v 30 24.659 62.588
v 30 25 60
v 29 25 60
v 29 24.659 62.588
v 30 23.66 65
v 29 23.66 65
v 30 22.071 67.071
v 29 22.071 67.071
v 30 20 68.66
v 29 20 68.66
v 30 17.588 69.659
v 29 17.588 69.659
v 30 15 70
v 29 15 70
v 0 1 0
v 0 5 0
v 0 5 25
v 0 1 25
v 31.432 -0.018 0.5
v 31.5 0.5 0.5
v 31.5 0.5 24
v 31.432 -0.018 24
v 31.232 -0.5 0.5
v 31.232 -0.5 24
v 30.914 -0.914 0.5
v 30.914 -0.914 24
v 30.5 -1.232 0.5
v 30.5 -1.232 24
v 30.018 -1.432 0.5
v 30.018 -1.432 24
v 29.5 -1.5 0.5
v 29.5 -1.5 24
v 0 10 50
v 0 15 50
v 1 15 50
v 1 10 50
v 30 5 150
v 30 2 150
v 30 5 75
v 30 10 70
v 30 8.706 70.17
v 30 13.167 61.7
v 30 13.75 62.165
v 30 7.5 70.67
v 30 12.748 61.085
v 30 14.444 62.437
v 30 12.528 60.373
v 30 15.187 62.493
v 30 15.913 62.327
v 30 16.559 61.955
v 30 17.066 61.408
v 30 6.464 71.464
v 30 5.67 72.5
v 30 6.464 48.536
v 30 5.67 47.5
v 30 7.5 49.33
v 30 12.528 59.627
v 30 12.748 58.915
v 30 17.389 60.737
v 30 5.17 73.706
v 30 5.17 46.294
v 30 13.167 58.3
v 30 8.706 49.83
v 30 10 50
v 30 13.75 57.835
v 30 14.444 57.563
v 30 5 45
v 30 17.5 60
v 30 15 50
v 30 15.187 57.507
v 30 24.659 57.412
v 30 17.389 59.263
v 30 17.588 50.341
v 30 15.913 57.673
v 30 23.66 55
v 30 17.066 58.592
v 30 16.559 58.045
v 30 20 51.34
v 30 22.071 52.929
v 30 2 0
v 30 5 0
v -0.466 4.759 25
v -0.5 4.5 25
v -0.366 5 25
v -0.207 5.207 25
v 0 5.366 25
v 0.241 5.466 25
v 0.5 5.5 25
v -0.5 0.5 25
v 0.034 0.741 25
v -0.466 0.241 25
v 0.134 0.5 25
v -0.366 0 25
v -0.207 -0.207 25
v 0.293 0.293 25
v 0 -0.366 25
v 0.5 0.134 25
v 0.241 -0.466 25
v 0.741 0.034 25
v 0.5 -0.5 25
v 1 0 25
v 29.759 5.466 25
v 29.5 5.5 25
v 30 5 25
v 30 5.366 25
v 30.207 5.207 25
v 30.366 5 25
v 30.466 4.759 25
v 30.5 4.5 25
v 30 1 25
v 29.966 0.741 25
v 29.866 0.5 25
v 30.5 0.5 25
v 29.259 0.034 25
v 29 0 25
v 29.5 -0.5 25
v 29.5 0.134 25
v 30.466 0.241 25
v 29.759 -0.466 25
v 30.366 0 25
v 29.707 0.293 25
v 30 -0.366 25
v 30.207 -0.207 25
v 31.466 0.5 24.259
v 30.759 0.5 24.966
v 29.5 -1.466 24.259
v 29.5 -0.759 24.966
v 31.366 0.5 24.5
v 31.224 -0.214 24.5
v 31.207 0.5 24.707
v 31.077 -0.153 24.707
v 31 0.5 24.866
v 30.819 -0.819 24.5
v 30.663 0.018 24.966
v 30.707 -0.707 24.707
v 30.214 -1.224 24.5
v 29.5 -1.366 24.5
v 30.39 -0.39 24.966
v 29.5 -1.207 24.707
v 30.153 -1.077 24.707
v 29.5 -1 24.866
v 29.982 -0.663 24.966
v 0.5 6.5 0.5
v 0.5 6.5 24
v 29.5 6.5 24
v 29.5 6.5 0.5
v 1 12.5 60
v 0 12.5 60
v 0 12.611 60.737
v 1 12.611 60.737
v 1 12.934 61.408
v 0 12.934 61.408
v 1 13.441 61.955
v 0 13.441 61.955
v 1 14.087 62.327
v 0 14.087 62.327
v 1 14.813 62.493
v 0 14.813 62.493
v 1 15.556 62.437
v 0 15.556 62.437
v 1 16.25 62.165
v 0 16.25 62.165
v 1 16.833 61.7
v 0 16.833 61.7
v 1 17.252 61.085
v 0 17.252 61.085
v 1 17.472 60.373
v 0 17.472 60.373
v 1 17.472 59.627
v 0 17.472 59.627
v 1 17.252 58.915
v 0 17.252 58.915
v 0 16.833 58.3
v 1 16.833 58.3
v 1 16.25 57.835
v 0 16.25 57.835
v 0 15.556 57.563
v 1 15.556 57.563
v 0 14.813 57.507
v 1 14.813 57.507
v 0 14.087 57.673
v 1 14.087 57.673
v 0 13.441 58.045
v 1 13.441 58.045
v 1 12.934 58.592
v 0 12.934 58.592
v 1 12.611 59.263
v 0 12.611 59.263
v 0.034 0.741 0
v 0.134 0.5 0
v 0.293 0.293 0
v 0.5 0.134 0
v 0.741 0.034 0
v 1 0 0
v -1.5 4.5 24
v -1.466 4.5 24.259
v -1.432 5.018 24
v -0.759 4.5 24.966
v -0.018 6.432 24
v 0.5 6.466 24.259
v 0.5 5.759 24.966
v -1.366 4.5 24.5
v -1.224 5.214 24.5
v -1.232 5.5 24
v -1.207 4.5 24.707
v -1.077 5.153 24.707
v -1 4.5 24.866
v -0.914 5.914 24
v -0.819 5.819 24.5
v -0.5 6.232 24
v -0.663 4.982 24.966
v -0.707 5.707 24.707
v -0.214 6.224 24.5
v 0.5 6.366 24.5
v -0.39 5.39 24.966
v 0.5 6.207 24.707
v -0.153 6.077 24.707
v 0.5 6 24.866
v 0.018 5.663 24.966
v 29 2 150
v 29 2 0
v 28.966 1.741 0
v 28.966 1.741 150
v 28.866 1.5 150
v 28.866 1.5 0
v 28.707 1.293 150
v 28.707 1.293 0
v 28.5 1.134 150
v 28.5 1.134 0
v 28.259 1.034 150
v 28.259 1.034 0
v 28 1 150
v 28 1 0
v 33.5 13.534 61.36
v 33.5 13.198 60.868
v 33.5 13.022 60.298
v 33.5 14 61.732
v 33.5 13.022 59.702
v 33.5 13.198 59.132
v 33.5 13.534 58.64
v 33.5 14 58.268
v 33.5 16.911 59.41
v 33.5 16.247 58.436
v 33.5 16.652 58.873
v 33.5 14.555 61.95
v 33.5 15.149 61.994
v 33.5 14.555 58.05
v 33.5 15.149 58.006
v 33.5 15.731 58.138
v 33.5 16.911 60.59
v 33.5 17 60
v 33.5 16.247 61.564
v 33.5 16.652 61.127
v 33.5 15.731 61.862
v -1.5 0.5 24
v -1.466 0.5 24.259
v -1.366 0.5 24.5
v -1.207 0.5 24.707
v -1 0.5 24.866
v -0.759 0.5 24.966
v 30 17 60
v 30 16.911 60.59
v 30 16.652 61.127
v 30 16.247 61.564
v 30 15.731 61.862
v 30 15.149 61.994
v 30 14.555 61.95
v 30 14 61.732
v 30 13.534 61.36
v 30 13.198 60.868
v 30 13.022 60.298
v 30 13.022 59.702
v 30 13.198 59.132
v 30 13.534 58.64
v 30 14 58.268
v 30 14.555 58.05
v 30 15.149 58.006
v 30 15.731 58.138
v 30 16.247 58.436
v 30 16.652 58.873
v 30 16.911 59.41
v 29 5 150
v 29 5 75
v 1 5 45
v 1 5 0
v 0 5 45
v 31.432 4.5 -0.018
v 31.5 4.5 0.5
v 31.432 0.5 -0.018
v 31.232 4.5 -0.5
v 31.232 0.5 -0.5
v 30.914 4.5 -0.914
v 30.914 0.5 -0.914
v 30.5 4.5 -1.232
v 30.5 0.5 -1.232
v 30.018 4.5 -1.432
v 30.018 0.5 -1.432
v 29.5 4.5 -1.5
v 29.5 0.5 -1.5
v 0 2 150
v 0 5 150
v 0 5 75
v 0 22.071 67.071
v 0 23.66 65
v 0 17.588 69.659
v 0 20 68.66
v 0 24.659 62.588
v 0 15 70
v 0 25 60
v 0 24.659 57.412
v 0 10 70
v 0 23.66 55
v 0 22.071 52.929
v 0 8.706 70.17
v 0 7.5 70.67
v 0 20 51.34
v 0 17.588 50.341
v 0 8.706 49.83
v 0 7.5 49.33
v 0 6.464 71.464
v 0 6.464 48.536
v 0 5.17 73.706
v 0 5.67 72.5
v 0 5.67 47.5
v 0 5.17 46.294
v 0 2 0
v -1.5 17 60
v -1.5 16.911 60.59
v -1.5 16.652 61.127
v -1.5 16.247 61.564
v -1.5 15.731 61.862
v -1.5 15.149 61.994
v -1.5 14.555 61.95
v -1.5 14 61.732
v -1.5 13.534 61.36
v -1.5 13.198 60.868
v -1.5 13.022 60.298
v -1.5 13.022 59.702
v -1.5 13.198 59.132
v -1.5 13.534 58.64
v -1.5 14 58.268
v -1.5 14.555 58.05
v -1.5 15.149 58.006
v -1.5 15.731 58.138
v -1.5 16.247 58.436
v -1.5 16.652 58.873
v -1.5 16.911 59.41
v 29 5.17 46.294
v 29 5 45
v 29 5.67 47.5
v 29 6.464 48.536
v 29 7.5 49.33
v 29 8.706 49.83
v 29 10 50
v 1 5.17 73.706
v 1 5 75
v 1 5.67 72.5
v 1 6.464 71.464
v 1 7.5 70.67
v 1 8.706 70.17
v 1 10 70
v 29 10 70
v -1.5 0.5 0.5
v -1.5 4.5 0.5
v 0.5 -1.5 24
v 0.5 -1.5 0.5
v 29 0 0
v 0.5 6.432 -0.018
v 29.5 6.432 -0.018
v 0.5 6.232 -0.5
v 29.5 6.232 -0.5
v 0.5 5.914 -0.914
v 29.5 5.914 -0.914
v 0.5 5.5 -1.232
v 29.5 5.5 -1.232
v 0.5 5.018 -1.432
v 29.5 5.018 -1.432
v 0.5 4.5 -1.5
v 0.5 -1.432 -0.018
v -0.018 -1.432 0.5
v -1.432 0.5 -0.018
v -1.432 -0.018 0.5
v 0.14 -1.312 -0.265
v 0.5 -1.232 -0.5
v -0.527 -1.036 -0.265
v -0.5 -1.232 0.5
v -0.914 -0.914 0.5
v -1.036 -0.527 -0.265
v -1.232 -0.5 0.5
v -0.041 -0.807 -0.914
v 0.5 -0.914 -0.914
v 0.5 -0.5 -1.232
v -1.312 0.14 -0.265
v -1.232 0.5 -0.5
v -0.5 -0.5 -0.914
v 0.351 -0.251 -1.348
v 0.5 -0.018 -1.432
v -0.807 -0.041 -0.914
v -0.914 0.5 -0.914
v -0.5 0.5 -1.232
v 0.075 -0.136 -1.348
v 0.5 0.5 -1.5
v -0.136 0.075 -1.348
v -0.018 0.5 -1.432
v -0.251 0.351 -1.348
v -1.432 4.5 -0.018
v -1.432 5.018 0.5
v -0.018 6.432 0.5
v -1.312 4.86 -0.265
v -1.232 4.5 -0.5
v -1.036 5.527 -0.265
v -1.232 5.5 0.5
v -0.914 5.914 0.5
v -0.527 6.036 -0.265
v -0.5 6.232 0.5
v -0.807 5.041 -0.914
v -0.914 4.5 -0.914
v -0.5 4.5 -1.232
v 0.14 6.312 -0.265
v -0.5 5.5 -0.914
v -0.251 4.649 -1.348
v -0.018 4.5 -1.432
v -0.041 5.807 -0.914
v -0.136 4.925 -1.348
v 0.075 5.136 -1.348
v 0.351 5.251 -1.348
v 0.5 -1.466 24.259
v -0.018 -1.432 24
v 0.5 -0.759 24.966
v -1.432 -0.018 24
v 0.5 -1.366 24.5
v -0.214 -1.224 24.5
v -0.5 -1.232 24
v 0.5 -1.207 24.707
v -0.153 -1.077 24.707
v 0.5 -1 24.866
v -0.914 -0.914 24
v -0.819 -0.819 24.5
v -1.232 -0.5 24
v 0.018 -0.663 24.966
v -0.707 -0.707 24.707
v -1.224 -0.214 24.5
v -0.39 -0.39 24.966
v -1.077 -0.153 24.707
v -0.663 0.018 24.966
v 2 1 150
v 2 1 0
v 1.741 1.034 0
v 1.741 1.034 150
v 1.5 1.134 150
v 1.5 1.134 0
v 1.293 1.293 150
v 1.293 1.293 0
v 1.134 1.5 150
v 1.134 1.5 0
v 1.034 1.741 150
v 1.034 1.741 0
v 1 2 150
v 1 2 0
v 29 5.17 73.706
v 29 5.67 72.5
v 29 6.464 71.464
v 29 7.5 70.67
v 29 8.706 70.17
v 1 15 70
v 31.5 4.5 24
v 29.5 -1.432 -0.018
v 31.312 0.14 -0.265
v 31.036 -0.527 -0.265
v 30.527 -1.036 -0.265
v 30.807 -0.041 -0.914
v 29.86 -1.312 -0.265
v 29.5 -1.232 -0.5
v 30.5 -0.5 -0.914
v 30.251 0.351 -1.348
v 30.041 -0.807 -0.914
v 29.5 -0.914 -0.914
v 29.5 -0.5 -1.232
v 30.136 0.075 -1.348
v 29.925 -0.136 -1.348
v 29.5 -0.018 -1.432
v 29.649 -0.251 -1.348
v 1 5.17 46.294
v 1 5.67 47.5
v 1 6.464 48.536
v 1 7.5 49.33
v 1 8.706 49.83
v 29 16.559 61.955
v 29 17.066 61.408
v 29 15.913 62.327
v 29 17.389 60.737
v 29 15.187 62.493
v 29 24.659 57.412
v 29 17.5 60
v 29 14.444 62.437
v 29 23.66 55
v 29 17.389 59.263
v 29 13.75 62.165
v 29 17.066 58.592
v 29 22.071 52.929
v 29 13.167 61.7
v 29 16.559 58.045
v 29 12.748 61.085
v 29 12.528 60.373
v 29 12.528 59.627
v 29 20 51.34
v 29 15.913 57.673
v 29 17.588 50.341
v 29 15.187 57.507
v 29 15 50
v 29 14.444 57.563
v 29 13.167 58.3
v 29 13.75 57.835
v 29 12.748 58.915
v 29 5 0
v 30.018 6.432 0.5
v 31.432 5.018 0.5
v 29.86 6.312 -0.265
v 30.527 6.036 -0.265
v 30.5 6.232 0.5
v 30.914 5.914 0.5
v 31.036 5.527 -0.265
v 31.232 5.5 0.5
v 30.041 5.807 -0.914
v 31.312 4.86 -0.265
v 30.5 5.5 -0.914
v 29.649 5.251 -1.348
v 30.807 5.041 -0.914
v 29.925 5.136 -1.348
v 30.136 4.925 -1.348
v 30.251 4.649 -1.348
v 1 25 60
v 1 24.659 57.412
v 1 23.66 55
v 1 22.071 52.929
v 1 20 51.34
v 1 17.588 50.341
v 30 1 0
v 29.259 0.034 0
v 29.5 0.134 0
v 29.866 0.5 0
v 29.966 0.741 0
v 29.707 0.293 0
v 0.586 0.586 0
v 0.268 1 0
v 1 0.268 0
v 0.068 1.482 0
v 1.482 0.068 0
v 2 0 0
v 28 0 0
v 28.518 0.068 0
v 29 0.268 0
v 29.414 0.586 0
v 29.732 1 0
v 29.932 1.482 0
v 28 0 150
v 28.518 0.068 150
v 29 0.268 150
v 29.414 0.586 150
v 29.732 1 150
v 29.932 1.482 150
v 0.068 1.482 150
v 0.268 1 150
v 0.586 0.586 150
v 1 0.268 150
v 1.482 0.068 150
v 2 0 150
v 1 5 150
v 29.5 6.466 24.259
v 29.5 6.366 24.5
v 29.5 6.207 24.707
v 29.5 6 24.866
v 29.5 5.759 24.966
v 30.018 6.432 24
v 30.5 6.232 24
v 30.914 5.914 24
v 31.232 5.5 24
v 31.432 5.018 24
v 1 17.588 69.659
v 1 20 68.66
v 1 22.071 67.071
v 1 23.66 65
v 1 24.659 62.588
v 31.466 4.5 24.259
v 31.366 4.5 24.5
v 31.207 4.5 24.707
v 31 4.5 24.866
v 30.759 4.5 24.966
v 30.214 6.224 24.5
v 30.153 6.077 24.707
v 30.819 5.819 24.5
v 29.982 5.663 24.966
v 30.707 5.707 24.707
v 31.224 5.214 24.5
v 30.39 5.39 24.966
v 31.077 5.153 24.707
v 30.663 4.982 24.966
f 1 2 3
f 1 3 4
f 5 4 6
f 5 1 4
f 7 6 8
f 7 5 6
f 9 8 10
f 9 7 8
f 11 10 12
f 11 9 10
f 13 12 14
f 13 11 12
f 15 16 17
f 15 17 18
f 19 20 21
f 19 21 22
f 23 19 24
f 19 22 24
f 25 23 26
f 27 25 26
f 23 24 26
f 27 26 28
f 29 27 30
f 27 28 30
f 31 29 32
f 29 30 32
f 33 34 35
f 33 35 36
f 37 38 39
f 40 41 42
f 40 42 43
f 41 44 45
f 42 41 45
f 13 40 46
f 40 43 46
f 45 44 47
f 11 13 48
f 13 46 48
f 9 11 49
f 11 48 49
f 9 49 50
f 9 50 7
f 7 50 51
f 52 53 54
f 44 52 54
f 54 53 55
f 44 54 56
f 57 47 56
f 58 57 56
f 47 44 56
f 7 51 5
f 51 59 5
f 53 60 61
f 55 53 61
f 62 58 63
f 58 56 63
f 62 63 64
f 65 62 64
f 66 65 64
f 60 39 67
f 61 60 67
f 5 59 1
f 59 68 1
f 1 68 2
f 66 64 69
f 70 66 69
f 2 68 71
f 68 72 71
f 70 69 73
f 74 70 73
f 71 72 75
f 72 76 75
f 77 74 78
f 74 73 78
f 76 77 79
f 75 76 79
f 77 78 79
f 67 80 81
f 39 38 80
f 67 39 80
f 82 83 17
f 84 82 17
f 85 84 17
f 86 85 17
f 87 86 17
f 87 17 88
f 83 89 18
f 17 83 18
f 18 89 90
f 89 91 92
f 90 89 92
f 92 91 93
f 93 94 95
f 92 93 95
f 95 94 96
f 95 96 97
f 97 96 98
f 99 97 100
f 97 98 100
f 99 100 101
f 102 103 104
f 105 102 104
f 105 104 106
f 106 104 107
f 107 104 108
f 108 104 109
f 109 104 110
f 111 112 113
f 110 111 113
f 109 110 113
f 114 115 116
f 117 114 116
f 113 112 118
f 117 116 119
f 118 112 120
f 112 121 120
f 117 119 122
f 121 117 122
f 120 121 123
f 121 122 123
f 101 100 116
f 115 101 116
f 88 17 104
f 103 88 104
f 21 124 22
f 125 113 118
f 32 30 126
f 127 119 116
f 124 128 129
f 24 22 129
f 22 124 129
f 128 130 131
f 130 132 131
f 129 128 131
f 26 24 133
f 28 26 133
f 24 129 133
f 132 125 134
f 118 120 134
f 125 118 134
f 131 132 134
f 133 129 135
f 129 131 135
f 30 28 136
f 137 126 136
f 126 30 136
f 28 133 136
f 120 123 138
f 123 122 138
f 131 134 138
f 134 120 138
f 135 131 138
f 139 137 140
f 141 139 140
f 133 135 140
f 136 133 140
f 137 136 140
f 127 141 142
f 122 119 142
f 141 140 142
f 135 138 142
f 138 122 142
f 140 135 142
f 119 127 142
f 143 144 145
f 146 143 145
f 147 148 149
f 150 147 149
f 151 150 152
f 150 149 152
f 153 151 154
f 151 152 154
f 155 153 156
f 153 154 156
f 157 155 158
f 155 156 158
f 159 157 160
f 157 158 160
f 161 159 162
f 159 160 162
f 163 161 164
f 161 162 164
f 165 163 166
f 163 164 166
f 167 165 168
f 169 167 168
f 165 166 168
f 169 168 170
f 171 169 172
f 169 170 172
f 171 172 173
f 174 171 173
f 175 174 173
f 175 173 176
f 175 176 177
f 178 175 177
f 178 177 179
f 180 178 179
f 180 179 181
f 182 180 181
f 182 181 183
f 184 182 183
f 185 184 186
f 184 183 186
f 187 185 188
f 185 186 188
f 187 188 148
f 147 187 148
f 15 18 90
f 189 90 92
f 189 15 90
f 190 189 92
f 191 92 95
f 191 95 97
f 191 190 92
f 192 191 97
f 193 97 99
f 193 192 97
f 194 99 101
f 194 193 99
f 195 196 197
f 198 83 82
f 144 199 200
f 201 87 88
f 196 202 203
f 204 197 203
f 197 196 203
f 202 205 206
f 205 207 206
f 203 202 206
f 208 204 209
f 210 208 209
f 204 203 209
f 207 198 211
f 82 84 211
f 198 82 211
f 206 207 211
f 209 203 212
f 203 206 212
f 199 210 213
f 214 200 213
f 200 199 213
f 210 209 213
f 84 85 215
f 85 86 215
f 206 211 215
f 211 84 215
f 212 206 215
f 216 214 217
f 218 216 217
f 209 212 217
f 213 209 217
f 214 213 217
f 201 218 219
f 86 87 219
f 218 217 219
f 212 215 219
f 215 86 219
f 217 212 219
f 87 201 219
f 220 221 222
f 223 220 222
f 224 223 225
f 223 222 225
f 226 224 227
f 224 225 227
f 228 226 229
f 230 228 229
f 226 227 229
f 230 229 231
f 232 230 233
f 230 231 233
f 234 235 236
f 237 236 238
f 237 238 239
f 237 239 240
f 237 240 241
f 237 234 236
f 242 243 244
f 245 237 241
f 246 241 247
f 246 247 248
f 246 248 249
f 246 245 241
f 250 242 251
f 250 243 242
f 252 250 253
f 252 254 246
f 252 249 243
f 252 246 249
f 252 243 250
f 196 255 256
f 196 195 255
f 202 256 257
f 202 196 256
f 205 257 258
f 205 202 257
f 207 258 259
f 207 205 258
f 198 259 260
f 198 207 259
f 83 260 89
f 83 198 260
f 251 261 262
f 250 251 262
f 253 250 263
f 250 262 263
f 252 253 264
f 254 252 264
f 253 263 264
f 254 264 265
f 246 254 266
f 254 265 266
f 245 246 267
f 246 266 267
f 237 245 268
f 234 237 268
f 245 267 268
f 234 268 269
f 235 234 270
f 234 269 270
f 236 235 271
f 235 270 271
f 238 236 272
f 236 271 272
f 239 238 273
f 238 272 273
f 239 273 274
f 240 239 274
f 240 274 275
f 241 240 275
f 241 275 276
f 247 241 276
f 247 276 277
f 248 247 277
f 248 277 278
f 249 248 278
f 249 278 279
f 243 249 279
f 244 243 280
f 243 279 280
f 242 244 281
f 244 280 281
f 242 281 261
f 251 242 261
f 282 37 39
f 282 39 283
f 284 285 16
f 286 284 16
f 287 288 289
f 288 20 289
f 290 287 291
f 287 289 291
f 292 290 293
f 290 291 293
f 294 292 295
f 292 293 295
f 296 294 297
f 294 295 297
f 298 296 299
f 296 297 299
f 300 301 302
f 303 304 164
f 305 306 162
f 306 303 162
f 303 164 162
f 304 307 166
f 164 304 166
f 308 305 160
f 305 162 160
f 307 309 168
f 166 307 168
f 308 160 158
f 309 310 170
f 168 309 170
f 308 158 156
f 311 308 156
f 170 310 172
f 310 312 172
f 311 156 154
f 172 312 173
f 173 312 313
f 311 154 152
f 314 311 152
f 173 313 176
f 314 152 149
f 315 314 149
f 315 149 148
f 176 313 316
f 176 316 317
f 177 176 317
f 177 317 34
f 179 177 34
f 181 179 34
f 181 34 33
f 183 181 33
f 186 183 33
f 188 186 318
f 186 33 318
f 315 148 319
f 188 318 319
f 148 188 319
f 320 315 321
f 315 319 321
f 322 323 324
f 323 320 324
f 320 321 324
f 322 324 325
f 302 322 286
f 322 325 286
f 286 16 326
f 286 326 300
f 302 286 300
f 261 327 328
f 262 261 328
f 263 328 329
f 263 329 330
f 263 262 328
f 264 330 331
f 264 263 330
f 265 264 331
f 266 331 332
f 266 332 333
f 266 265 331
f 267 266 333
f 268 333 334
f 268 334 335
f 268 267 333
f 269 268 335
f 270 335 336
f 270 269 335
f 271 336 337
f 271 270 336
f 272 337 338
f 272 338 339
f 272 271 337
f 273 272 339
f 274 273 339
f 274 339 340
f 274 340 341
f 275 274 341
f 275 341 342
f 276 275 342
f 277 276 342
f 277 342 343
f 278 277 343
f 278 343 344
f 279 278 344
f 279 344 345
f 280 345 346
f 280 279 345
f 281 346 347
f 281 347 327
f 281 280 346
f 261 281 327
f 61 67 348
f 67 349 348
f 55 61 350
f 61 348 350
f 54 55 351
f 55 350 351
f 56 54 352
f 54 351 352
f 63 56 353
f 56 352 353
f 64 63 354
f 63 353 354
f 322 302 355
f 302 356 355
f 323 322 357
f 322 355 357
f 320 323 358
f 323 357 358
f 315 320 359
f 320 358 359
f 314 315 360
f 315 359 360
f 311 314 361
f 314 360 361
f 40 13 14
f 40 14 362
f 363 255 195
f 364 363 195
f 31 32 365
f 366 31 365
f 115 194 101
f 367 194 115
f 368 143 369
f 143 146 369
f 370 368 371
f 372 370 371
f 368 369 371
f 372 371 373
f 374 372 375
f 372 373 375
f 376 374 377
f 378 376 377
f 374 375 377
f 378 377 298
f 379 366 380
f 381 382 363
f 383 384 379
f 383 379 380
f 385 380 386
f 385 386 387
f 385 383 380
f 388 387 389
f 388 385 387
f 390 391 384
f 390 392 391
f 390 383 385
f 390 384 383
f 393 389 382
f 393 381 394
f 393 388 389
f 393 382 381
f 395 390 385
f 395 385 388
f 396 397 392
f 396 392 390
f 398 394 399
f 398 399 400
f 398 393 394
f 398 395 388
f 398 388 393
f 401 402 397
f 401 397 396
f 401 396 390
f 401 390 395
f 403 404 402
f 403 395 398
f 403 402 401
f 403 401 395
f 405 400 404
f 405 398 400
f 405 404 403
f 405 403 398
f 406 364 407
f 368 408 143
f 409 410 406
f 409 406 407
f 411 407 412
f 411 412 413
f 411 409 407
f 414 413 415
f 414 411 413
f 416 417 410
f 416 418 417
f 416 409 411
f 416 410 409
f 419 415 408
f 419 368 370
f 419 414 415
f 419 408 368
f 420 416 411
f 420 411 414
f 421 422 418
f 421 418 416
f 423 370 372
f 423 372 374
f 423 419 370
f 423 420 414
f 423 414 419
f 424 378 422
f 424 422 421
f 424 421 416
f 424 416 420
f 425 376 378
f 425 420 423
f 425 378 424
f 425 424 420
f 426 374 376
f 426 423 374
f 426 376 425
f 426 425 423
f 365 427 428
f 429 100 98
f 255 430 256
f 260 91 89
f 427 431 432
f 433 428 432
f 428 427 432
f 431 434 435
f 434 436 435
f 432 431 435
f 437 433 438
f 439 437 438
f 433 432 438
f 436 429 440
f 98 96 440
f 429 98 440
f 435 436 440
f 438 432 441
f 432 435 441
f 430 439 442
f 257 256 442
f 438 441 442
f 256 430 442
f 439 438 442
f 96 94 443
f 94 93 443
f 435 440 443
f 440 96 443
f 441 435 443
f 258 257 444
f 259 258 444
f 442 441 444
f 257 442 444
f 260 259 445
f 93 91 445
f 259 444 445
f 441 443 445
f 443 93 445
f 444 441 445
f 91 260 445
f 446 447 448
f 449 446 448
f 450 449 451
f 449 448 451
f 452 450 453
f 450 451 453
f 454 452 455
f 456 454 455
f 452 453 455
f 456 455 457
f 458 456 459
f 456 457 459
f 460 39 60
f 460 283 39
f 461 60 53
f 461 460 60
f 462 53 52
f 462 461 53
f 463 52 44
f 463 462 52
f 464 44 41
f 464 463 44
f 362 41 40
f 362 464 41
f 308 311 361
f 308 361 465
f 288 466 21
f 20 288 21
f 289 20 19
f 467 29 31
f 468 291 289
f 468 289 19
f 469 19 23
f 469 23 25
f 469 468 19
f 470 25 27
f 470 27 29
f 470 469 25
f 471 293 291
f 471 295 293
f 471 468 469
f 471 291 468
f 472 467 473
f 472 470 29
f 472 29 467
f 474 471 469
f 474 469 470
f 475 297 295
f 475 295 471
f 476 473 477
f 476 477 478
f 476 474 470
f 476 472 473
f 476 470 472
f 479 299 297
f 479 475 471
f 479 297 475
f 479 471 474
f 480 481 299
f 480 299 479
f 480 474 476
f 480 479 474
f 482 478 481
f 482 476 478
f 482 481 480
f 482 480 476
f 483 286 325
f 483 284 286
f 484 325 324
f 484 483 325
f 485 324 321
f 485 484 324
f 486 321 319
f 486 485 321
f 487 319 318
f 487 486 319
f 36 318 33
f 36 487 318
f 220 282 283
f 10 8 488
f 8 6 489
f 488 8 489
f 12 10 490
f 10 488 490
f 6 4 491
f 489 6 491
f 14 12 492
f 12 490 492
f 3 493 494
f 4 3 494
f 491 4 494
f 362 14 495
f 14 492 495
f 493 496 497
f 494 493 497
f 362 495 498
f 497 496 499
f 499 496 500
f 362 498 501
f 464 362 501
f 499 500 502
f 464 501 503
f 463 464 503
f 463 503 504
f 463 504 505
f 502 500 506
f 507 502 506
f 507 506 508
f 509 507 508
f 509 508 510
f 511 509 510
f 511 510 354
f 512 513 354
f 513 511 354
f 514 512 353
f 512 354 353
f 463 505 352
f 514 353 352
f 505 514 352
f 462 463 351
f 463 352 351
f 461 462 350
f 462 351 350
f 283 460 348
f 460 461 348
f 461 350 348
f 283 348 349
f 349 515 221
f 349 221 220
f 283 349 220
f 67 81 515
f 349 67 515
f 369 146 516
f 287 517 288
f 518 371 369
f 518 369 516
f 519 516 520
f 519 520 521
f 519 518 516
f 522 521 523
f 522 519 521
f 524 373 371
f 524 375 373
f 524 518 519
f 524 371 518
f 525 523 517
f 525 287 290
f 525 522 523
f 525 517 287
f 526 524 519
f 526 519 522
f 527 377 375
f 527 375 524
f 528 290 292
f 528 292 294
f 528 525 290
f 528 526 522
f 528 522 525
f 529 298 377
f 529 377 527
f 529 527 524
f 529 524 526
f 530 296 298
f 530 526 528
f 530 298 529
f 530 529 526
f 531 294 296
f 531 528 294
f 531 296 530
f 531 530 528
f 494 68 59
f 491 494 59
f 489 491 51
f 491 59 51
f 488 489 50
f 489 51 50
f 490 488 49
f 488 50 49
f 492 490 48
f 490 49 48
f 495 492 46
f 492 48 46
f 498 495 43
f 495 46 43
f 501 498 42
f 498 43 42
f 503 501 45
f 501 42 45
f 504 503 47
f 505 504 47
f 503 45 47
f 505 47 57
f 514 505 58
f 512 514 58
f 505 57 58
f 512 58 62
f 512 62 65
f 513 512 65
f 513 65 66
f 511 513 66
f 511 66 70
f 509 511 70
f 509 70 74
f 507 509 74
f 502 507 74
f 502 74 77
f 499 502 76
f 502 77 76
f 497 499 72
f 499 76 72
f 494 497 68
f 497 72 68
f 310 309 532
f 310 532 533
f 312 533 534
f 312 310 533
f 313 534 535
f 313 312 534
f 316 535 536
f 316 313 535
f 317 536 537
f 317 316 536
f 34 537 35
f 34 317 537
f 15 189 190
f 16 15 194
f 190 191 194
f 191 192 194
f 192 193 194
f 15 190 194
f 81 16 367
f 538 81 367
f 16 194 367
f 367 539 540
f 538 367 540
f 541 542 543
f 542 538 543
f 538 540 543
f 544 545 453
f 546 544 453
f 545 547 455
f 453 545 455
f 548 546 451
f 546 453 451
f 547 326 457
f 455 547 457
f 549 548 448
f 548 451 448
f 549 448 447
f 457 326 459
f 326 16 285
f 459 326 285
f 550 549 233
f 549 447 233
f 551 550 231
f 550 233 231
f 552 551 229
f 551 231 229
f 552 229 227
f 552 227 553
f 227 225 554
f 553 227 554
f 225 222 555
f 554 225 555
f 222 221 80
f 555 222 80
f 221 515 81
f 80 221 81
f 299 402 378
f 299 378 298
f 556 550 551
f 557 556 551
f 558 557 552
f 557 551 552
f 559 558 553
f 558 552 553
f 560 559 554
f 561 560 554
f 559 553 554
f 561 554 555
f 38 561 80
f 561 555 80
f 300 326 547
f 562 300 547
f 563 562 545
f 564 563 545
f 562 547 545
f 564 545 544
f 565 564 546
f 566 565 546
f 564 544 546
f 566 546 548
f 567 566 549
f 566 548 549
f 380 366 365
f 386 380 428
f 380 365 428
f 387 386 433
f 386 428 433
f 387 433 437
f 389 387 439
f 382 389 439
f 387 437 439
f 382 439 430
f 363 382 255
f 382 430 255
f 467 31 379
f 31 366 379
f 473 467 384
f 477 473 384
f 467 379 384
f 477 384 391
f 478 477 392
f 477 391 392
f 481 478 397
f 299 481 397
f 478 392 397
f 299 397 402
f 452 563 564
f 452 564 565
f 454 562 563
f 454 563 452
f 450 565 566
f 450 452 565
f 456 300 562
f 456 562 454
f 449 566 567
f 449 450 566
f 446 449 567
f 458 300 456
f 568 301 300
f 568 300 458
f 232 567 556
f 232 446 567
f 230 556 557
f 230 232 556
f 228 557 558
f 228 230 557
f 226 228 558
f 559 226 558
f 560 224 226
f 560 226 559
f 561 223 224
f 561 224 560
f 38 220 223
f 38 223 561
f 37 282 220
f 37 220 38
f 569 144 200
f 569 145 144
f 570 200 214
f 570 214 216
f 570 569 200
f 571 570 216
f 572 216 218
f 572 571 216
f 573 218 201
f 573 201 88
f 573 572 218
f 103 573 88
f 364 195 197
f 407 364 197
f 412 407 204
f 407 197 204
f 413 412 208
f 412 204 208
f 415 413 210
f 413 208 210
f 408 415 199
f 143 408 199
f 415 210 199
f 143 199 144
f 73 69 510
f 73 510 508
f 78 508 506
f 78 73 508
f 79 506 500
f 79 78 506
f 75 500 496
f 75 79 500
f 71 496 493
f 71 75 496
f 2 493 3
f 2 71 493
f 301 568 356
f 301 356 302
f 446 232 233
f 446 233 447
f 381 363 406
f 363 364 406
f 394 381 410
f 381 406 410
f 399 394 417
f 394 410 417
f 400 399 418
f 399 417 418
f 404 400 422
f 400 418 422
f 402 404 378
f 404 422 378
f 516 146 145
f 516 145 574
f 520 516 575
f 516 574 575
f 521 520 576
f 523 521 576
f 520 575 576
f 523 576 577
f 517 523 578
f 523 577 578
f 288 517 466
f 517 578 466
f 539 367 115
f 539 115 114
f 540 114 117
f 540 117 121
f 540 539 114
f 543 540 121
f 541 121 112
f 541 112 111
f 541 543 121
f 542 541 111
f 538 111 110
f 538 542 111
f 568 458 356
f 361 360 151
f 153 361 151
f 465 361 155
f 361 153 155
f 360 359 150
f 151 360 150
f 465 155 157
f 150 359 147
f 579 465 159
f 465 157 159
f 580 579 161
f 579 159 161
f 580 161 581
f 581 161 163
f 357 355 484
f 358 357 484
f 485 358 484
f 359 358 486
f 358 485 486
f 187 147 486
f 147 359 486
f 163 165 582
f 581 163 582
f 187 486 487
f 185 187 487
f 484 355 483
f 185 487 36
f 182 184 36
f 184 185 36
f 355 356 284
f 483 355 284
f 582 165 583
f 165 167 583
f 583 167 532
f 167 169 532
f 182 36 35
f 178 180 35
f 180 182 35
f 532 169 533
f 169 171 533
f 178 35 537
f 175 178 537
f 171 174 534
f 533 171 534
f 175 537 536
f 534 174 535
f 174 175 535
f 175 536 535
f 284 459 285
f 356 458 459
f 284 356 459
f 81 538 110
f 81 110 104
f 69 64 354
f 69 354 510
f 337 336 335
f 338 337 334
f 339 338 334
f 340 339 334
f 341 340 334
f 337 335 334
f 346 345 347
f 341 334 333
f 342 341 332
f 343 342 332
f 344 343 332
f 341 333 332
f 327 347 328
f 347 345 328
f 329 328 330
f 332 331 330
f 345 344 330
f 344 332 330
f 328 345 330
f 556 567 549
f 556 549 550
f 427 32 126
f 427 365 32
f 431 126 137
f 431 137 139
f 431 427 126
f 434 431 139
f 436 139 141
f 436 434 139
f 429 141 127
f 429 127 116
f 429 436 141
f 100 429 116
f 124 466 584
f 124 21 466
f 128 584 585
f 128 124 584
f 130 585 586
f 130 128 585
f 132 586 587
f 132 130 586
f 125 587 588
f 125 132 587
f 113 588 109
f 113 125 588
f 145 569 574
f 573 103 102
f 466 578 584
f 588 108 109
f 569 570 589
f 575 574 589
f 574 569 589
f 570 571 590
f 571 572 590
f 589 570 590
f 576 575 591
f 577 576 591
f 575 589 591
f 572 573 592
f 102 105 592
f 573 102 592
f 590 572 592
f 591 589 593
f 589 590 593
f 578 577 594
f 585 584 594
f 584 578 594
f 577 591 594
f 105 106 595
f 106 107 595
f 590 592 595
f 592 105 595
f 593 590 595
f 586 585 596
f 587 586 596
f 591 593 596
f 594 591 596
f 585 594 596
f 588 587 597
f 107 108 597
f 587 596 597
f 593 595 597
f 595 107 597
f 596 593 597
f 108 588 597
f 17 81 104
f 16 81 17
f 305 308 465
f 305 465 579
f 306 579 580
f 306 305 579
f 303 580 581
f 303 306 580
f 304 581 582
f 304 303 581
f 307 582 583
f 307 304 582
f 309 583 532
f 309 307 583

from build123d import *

# Parameters (mm, degrees)
F1_DEPTH       = 150
F2_R           = 2.5
F3_DEPTH       = 1
F4_R           = 5
F5_R           = 2.5
F6_DEPTH       = 1
F7_R           = 5
F10_R          = 2
F11_DEPTH      = 31.5
F11_DEPTH_BACK = 3.5
F13_DEPTH      = 25
F15_DEPTH      = 1.5
F16_R          = 2
F17_R          = 1


with BuildPart() as f1:
    # F0 (on Top) → F1 (new body)
    with BuildSketch(Plane.XY):
        with BuildLine():
            ThreePointArc((0, 2), (0.5857864376, 0.5857864376), (2, 0))
            Line((2, 0), (28, 0))
            ThreePointArc((28, 0), (29.4142135624, 0.5857864376), (30, 2))
            Line((30, 2), (30, 5))
            Line((30, 5), (29, 5))
            Line((29, 5), (29, 2))
            ThreePointArc((29, 2), (28.7071067812, 1.2928932188), (28, 1))
            Line((28, 1), (2, 1))
            ThreePointArc((2, 1), (1.2928932188, 1.2928932188), (1, 2))
            Line((1, 2), (1, 5))
            Line((1, 5), (0, 5))
            Line((0, 5), (0, 2))
        make_face()
    extrude(amount=F1_DEPTH)

    # F2 (on face) → F3 (join)
    with BuildSketch(Plane(origin=(0, 0, 0), x_dir=(0, -1, 0), z_dir=(-1, 0, 0))):
        with BuildLine():
            Line((-15, 50), (-5, 50))
            Line((-5, 50), (-5, 70))
            Line((-5, 70), (-15, 70))
            ThreePointArc((-15, 70), (-22.0710678119, 67.0710678119), (-25, 60))
            ThreePointArc((-25, 60), (-22.0710678119, 52.9289321881), (-15, 50))
        make_face()
        with Locations((-15, 60)):
            Circle(F2_R, mode=Mode.SUBTRACT)
    extrude(amount=-F3_DEPTH)

    # F4
    f4_edges = [f1.edges().sort_by_distance(p)[0] for p in [
        (0.5, 5, 50),
        (0.5, 5, 70),
    ]]
    fillet(f4_edges, radius=F4_R)

    # F5 (on face) → F6 (join)
    with BuildSketch(Plane.YZ.offset(30)):
        with BuildLine():
            Line((15, 70), (5, 70))
            Line((5, 70), (5, 50))
            Line((5, 50), (15, 50))
            ThreePointArc((15, 50), (22.0710678119, 52.9289321881), (25, 60))
            ThreePointArc((25, 60), (22.0710678119, 67.0710678119), (15, 70))
        make_face()
        with Locations((15, 60)):
            Circle(F5_R, mode=Mode.SUBTRACT)
    extrude(amount=-F6_DEPTH)

    # F7
    f7_edges = [f1.edges().sort_by_distance(p)[0] for p in [
        (29.5, 5, 70),
        (29.5, 5, 50),
    ]]
    fillet(f7_edges, radius=F7_R)


with BuildPart() as f8_1:
    # F8: copy of F1
    add(f1.part.moved(Location((0, 75, 0))))


with BuildPart() as f11:
    # F10 (on face) → F11 (new body, two sides)
    with BuildSketch(Plane.YZ.offset(30)) as f11_sk:
        with Locations((15, 60)):
            Circle(F10_R)
    extrude(amount=-F11_DEPTH)
    extrude(f11_sk.sketch, amount=F11_DEPTH_BACK)


with BuildPart() as f13:
    # F12 (on face) → F13 (new body)
    with BuildSketch(Plane(origin=(0, 0, 0), x_dir=(1, 0, 0), z_dir=(0, 0, -1))):
        with BuildLine():
            Line((31.5, -4.5), (31.5, -0.5))
            ThreePointArc((31.5, -0.5), (30.9142135624, 0.9142135624), (29.5, 1.5))
            Line((29.5, 1.5), (0.5, 1.5))
            ThreePointArc((0.5, 1.5), (-0.9142135624, 0.9142135624), (-1.5, -0.5))
            Line((-1.5, -0.5), (-1.5, -4.5))
            ThreePointArc((-1.5, -4.5), (-0.9142135624, -5.9142135624), (0.5, -6.5))
            Line((0.5, -6.5), (29.5, -6.5))
            ThreePointArc((29.5, -6.5), (30.9142135624, -5.9142135624), (31.5, -4.5))
        make_face()
        with BuildLine():
            ThreePointArc((0, -1), (0.2928932188, -0.2928932188), (1, 0))
            Line((1, 0), (2, 0))
            Line((2, 0), (28, 0))
            Line((28, 0), (29, 0))
            ThreePointArc((29, 0), (29.7071067812, -0.2928932188), (30, -1))
            Line((30, -1), (30, -2))
            Line((30, -2), (30, -5))
            Line((30, -5), (29, -5))
            Line((29, -5), (1, -5))
            Line((1, -5), (0, -5))
            Line((0, -5), (0, -2))
            Line((0, -2), (0, -1))
        make_face(mode=Mode.SUBTRACT)
    extrude(amount=-F13_DEPTH)

    # F14 (on face) → F15 (join)
    with BuildSketch(Plane(origin=(0, 0, 0), x_dir=(1, 0, 0), z_dir=(0, 0, -1))):
        with BuildLine():
            Line((29.5, 1.5), (0.5, 1.5))
            ThreePointArc((0.5, 1.5), (-0.9142135624, 0.9142135624), (-1.5, -0.5))
            Line((-1.5, -0.5), (-1.5, -4.5))
            ThreePointArc((-1.5, -4.5), (-0.9142135624, -5.9142135624), (0.5, -6.5))
            Line((0.5, -6.5), (29.5, -6.5))
            ThreePointArc((29.5, -6.5), (30.9142135624, -5.9142135624), (31.5, -4.5))
            Line((31.5, -4.5), (31.5, -0.5))
            ThreePointArc((31.5, -0.5), (30.9142135624, 0.9142135624), (29.5, 1.5))
        make_face()
    extrude(amount=F15_DEPTH)

    # F16
    f16_edges = [f13.edges().sort_by_distance(p)[0] for p in [
        (15, -1.5, -1.5),
        (-0.914214, 5.914214, -1.5),
        (-1.5, 2.5, -1.5),
        (-0.914214, -0.914214, -1.5),
        (30.914214, -0.914214, -1.5),
        (31.5, 2.5, -1.5),
        (30.914214, 5.914214, -1.5),
        (15, 6.5, -1.5),
    ]]
    fillet(f16_edges, radius=F16_R)

    # F17
    f17_edges = [f13.edges().sort_by_distance(p)[0] for p in [
        (15, -1.5, 25),
        (-0.914214, 5.914214, 25),
        (15, 6.5, 25),
        (30.914214, 5.914214, 25),
        (31.5, 2.5, 25),
        (30.914214, -0.914214, 25),
        (-0.914214, -0.914214, 25),
        (-1.5, 2.5, 25),
    ]]
    fillet(f17_edges, radius=F17_R)


solid = Compound([f1.part, f11.part, f13.part])
